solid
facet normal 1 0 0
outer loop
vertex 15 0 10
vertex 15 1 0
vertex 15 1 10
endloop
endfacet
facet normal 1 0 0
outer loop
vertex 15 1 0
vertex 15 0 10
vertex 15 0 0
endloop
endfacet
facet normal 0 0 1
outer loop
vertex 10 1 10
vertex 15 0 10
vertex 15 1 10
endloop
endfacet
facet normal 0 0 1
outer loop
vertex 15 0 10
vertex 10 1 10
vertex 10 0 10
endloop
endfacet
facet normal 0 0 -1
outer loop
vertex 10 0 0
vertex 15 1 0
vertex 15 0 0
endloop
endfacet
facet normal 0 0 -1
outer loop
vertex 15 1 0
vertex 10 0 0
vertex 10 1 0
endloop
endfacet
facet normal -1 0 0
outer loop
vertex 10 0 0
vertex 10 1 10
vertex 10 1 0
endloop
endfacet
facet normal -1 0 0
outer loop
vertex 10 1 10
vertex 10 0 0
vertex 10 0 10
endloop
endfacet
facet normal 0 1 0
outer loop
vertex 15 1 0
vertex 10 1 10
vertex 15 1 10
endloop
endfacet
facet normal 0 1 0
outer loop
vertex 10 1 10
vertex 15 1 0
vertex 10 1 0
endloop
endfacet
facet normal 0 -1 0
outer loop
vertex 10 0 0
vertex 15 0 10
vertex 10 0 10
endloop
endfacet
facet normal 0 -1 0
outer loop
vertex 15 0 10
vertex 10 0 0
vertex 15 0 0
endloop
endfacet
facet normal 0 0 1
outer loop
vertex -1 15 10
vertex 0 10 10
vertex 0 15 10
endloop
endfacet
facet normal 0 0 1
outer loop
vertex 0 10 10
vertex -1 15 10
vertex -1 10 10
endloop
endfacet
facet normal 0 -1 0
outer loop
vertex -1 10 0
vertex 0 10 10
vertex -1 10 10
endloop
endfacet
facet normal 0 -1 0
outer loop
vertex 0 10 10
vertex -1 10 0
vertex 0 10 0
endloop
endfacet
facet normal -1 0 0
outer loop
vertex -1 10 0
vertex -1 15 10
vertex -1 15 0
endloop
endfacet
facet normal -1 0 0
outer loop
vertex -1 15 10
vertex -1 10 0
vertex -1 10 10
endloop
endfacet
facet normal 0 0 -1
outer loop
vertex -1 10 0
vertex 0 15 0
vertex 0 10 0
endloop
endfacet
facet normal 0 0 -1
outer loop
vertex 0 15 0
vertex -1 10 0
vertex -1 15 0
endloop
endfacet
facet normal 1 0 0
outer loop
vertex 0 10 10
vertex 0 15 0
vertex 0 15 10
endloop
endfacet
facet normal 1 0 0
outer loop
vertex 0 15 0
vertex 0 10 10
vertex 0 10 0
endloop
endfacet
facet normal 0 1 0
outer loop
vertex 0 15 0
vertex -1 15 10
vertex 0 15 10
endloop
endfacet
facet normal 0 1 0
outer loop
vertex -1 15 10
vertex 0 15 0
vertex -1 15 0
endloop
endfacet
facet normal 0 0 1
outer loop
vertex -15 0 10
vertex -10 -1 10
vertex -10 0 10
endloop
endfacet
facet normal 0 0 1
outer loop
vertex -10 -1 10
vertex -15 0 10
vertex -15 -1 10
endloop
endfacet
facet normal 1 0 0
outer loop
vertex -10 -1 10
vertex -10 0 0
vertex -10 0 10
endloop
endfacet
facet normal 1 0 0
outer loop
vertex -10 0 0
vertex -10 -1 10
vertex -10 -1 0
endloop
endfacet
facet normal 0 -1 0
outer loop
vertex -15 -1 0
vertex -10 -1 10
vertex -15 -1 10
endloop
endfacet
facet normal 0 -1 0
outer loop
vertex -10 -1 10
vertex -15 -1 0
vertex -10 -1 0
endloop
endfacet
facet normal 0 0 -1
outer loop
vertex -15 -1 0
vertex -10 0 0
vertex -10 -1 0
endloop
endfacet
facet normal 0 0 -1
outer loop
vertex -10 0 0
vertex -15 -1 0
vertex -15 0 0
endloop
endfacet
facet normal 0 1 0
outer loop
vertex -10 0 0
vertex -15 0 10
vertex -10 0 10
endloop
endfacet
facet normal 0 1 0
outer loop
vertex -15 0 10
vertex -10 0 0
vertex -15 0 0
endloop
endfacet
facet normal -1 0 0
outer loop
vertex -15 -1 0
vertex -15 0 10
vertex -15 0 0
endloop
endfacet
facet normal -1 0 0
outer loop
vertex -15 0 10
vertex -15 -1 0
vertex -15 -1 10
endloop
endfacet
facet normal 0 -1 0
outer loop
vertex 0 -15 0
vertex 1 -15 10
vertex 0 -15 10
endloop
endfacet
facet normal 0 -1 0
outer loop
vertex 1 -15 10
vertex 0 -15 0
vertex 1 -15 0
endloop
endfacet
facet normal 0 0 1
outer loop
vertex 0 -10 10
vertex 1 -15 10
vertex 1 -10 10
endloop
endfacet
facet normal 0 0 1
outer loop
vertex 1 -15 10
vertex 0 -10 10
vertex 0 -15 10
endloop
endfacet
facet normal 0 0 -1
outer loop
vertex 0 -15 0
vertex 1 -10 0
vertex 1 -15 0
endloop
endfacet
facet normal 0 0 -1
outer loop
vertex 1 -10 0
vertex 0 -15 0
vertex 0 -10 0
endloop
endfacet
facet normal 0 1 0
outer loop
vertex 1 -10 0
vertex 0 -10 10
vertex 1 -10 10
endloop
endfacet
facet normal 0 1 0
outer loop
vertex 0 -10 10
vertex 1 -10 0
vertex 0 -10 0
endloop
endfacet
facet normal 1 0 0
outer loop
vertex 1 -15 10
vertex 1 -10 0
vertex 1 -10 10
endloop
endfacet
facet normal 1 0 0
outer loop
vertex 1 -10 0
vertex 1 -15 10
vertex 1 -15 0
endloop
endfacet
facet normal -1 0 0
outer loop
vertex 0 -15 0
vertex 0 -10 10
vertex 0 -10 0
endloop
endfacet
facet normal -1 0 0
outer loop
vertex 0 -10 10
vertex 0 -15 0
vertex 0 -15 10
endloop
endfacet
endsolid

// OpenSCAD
// Generated by scadwright. Do not hand-edit —
// edit the Python source and regenerate.

union() {
    translate([10, 0, 0]) {
        cube([5, 1, 10], center=false);
    }

    rotate(a=90, v=[0, 0, 1]) {
        translate([10, 0, 0]) {
            cube([5, 1, 10], center=false);
        }
    }

    rotate(a=180, v=[0, 0, 1]) {
        translate([10, 0, 0]) {
            cube([5, 1, 10], center=false);
        }
    }

    rotate(a=270, v=[0, 0, 1]) {
        translate([10, 0, 0]) {
            cube([5, 1, 10], center=false);
        }
    }
}
